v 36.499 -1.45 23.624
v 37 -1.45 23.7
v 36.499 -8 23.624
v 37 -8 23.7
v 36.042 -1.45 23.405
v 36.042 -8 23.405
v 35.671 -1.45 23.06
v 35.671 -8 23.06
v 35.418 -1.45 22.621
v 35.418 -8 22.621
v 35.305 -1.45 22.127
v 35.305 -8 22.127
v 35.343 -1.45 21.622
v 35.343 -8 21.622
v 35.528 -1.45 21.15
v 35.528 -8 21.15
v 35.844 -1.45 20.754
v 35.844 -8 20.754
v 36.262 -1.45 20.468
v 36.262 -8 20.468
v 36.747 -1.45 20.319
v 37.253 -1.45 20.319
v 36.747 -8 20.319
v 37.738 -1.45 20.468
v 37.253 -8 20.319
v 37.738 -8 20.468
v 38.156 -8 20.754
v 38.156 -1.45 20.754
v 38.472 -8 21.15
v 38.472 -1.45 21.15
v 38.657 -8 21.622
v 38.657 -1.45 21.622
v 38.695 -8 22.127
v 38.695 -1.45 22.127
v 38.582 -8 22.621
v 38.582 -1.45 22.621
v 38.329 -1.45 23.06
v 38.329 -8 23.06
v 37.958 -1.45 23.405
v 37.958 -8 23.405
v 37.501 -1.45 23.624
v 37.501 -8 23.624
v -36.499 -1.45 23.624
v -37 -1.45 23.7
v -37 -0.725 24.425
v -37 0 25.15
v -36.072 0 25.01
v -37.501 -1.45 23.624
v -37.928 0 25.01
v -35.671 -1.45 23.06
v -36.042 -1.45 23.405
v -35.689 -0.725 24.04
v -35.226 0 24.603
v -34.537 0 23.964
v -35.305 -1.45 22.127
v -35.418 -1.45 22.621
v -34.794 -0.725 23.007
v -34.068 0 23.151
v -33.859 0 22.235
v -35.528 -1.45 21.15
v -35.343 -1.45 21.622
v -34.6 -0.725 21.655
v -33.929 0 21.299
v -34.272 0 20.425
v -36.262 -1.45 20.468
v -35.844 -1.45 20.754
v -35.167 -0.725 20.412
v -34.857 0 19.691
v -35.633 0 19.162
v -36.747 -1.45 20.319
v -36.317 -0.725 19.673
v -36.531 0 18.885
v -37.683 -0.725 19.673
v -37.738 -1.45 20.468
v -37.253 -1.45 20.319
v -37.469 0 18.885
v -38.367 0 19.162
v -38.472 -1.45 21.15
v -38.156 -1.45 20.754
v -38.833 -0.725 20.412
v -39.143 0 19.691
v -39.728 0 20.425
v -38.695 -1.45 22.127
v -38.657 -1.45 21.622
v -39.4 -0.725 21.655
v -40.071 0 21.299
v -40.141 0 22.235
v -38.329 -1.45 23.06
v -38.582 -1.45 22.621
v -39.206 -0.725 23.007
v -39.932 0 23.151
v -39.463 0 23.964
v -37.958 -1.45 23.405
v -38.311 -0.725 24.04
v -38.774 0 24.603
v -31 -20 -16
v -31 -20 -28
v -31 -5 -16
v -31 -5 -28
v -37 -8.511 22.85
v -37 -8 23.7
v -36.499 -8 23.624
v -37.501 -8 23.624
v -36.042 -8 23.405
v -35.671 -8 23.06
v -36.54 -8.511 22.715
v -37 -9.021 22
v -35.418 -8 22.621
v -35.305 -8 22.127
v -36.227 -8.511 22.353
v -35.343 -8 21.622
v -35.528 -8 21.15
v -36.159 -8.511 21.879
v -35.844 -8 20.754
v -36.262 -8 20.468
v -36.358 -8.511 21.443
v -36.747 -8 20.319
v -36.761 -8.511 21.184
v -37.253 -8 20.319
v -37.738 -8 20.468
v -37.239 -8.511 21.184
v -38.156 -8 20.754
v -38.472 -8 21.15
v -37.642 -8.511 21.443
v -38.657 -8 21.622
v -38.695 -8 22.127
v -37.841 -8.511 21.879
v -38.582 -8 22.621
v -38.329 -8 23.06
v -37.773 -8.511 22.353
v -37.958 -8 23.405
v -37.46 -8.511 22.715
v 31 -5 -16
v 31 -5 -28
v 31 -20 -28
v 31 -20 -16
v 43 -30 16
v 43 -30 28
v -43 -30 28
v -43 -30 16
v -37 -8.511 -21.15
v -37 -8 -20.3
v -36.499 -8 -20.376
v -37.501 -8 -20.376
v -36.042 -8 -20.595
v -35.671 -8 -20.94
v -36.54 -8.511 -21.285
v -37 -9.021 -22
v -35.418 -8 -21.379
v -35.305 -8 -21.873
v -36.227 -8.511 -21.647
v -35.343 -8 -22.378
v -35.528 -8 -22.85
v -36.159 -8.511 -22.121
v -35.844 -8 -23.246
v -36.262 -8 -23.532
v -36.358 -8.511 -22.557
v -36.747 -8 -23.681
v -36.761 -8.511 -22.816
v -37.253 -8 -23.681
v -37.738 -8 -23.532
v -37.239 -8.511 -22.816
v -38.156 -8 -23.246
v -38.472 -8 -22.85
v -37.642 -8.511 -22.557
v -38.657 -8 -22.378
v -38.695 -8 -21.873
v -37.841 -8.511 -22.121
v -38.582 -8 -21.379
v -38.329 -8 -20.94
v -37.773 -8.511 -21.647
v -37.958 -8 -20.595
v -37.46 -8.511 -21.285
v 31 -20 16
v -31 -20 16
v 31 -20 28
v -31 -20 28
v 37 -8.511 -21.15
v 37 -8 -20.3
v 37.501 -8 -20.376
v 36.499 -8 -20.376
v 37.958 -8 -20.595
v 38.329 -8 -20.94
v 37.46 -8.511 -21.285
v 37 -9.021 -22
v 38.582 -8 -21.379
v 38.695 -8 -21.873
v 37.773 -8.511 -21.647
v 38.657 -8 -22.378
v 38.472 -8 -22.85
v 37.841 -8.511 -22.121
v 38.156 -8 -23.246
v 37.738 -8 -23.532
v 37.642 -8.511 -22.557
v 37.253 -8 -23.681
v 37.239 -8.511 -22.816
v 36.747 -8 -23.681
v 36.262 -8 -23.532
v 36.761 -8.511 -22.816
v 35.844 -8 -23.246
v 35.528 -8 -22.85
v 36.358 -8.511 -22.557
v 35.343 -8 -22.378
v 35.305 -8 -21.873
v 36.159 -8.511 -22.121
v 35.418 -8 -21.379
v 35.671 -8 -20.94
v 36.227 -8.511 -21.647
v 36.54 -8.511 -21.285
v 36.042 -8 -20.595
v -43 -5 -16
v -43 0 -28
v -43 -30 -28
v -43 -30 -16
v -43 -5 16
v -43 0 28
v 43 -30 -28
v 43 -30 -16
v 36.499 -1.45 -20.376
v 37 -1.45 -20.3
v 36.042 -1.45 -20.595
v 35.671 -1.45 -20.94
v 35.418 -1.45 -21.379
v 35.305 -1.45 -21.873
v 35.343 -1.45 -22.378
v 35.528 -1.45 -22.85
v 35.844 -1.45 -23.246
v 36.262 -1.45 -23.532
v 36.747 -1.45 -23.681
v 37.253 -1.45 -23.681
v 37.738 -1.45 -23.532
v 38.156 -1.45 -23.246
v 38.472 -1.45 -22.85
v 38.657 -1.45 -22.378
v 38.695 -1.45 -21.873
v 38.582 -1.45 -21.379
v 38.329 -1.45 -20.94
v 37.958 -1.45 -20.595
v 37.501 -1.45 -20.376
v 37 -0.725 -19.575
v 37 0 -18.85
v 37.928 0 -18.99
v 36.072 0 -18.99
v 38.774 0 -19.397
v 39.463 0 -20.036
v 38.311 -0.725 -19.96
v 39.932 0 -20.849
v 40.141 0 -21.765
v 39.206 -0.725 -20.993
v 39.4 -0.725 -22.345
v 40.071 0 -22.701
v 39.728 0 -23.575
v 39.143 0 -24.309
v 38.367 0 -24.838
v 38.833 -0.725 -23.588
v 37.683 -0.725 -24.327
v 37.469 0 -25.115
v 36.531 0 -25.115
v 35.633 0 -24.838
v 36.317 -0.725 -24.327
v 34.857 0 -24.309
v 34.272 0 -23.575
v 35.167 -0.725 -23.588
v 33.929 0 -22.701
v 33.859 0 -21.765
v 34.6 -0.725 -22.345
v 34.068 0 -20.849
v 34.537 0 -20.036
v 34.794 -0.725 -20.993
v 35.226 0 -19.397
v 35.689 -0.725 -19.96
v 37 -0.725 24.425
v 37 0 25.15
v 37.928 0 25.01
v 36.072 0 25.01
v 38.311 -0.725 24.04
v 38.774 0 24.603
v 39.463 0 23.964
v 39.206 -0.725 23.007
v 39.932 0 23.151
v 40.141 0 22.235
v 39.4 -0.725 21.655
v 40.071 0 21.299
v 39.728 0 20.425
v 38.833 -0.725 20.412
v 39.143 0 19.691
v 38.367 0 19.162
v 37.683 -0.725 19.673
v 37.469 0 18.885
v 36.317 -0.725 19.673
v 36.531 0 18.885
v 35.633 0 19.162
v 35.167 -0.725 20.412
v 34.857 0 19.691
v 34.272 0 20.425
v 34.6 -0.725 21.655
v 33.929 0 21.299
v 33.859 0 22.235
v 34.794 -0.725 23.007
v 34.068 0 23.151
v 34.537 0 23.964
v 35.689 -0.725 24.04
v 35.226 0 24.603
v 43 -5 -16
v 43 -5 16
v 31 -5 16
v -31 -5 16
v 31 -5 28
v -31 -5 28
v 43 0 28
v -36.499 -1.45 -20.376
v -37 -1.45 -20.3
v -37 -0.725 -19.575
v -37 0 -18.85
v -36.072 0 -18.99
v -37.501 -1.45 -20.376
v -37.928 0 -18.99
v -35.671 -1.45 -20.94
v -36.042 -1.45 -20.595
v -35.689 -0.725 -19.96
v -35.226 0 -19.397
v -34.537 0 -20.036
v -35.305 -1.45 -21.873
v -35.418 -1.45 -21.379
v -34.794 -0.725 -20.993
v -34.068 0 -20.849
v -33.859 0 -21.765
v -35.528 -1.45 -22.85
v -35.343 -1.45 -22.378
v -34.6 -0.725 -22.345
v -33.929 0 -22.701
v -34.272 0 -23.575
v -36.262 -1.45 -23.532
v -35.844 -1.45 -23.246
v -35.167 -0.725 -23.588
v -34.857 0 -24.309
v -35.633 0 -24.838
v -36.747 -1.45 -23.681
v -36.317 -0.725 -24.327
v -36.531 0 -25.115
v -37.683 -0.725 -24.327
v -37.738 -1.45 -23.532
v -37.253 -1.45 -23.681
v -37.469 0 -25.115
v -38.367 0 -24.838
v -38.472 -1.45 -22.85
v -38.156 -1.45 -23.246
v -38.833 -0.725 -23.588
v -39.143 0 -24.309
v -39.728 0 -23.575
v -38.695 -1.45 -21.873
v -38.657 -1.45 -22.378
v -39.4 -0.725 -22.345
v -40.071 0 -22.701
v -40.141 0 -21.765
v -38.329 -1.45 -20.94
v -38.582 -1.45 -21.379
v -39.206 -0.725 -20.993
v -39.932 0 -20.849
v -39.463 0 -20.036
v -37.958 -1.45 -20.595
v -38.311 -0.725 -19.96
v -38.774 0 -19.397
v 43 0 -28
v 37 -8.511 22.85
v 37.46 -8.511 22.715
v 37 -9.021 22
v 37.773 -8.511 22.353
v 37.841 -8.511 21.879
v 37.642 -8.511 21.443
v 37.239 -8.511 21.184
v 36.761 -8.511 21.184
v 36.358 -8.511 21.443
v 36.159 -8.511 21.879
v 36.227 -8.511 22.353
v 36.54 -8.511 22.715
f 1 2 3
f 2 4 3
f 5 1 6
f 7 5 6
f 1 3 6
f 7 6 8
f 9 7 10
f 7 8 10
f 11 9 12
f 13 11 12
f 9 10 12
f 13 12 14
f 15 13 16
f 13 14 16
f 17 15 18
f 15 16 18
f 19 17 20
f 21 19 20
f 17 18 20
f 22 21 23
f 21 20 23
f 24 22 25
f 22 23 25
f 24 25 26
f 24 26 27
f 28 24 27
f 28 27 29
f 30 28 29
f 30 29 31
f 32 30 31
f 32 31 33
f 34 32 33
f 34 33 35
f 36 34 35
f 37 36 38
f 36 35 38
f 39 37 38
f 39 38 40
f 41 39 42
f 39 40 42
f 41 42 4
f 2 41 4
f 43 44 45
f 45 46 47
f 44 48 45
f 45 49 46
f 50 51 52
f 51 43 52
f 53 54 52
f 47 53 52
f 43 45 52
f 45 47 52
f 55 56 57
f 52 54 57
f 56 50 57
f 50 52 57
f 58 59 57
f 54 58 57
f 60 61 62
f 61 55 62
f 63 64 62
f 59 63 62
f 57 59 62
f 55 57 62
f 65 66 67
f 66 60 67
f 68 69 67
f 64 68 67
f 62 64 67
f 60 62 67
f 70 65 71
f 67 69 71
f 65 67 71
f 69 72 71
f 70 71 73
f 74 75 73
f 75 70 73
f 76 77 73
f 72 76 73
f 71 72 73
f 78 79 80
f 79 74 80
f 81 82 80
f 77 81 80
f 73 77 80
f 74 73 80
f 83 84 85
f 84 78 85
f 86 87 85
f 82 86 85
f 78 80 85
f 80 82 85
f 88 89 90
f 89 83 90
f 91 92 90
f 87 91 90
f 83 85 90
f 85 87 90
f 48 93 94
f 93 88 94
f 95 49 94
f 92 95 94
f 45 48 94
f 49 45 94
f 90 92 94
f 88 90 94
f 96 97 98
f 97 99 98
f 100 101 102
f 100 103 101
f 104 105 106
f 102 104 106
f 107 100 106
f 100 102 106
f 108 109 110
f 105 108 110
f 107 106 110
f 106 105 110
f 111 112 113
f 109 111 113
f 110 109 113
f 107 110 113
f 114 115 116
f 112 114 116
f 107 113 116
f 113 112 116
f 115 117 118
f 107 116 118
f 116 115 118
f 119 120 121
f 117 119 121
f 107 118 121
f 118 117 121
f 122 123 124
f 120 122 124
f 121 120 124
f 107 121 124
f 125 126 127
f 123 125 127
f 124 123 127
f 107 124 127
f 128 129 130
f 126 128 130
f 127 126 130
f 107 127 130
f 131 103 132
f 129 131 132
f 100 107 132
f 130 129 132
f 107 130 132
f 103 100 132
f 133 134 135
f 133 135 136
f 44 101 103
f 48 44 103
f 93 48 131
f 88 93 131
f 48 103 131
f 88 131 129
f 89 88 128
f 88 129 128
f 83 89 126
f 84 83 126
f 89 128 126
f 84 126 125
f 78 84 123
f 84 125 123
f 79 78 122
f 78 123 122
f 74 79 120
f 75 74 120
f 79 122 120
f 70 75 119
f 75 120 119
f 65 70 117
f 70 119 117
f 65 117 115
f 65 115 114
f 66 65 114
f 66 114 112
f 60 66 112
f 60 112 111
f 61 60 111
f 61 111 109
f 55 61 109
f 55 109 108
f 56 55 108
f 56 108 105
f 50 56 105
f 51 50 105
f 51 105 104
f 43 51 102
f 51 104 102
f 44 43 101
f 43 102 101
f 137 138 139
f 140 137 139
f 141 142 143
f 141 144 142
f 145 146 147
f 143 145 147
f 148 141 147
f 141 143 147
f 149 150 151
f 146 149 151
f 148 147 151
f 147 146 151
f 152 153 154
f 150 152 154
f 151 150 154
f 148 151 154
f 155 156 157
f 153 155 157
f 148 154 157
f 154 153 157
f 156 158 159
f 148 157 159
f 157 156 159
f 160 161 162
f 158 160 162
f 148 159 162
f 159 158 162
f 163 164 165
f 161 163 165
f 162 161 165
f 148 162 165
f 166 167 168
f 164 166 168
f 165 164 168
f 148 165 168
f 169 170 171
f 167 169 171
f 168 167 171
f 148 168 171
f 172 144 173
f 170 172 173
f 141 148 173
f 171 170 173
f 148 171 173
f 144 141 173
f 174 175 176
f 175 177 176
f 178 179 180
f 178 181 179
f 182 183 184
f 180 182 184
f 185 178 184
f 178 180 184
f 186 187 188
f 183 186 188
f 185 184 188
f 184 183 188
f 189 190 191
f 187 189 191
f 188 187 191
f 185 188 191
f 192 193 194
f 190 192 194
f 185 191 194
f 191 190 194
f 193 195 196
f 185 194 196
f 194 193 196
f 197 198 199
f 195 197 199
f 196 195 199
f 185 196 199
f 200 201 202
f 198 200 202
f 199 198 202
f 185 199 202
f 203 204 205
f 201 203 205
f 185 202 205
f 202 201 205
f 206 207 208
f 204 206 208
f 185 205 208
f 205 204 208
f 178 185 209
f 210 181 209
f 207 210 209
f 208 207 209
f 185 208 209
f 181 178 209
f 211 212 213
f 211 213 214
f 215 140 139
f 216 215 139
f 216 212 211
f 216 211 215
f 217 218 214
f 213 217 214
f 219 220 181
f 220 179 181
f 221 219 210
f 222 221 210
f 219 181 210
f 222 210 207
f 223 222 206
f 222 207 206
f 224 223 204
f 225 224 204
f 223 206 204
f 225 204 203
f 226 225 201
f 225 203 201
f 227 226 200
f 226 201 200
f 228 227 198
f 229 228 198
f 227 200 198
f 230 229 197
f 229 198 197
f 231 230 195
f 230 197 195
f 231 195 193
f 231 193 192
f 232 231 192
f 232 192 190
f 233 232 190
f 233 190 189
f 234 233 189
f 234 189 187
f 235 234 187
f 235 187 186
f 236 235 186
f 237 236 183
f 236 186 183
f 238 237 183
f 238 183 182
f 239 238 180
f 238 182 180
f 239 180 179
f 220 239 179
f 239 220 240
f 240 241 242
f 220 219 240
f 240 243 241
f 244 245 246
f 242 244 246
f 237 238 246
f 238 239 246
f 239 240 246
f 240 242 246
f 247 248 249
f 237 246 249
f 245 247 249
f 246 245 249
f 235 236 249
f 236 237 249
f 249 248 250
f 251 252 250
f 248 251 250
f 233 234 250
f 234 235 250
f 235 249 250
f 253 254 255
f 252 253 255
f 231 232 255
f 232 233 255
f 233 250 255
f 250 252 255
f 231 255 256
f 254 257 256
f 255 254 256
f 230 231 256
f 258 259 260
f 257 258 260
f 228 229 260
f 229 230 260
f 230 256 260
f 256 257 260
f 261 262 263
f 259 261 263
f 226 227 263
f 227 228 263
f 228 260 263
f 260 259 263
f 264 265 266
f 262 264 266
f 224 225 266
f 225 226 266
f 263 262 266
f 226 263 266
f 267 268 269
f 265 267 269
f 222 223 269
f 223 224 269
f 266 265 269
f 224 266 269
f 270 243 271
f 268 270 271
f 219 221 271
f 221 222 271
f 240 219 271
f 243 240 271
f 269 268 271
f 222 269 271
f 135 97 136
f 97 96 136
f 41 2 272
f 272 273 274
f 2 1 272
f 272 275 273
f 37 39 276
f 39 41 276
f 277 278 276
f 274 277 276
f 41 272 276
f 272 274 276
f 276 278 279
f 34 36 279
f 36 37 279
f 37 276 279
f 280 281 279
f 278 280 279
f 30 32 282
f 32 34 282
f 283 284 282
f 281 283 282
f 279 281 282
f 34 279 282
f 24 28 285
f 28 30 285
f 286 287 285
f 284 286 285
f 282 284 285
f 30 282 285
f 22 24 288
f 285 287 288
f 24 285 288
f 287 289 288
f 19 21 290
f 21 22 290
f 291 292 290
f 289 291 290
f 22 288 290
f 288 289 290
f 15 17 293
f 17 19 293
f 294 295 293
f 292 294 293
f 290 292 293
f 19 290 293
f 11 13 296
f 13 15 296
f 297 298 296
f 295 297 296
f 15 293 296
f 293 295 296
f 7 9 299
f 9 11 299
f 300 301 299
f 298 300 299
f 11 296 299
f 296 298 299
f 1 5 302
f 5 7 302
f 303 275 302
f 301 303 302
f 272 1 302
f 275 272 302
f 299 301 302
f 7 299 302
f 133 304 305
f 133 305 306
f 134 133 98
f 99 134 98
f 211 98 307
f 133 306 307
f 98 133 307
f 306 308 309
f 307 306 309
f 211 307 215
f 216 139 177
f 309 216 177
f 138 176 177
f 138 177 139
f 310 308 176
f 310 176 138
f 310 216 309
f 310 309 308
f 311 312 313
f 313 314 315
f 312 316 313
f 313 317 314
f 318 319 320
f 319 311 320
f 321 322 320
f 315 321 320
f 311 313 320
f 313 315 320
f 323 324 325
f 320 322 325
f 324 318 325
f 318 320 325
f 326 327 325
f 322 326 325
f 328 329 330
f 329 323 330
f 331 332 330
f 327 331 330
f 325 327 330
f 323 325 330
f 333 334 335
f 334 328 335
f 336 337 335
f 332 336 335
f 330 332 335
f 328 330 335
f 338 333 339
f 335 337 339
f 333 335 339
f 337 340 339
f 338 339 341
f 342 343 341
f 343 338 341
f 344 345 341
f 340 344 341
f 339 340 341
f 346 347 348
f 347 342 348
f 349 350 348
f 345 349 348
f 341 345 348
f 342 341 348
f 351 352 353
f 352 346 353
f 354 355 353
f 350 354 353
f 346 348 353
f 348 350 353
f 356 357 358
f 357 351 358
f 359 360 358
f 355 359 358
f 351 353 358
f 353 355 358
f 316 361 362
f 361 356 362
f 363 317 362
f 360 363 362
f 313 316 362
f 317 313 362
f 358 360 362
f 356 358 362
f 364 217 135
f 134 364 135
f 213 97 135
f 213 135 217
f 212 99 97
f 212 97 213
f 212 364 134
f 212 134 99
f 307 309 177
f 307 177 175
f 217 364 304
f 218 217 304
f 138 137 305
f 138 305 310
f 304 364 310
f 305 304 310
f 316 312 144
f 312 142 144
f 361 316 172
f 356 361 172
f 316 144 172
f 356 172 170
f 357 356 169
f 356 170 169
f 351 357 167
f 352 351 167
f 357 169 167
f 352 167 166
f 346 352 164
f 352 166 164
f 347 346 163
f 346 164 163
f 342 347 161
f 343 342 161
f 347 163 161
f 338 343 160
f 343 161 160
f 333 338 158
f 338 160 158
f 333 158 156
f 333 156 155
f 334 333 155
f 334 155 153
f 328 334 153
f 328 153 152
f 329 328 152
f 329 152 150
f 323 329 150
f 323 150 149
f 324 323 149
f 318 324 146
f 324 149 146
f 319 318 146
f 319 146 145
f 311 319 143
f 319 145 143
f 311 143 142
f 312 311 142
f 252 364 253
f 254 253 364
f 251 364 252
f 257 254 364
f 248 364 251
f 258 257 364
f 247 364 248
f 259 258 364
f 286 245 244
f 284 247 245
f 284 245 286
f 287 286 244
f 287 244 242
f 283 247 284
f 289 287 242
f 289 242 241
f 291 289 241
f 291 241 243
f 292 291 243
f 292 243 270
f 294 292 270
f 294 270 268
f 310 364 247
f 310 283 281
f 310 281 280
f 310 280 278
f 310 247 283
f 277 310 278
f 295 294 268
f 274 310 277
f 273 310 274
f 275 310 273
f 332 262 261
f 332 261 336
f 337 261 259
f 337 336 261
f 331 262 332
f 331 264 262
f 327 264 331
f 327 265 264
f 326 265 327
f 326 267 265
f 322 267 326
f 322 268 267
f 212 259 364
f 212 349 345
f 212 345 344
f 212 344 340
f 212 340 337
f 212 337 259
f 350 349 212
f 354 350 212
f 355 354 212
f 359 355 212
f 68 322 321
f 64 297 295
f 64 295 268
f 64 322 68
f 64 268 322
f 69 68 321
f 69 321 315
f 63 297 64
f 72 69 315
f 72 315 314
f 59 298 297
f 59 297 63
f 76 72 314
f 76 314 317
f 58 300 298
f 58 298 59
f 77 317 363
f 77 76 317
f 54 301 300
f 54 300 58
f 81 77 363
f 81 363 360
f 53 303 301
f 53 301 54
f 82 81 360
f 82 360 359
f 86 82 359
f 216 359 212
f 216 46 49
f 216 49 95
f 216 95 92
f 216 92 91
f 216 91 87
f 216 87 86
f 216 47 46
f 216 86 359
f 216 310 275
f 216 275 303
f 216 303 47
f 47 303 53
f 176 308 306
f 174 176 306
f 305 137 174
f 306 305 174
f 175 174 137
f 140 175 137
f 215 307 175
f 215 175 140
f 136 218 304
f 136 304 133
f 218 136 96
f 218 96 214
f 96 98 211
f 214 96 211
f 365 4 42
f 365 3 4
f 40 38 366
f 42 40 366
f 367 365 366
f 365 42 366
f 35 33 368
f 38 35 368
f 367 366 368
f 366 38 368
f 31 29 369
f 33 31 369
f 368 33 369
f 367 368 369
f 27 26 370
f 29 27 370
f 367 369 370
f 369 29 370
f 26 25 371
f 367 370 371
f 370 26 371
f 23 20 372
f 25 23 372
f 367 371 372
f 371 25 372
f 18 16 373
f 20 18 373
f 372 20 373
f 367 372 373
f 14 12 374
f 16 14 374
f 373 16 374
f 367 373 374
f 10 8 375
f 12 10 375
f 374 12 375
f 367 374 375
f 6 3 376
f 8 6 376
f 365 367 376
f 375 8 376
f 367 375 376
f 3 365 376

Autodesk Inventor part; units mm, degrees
ref_plane "YZ Plane" through (0, 0, 0) normal (1, 0, 0) x (0, 1, 0)
ref_plane "XZ Plane" through (0, 0, 0) normal (0, 1, 0) x (-1, 0, 0)
ref_plane "XY Plane" through (0, 0, 0) normal (0, 0, 1) x (1, 0, 0)
sketch "Sketch1" plane through (0, 0, 0) normal (0, 1, 0) x (-1, 0, 0)
  line L0 (-37, 22) -> (37, 22) construction
  line L1 (37, 22) -> (37, -22) construction
  line L2 (37, -22) -> (-37, -22) construction
  line L3 (-37, -22) -> (-37, 22) construction
  line L4 (-37, 22) -> (37, -22) construction
  line L5 (37, 22) -> (-37, -22) construction
  line L6 (-47, 32) -> (47, 32) construction
  line L7 (47, 32) -> (47, -32) construction
  line L8 (47, -32) -> (-47, -32) construction
  line L9 (-47, -32) -> (-47, 32) construction
  line L10 (-47, 32) -> (47, -32) construction
  line L11 (47, 32) -> (-47, -32) construction
  line L12 (31, 16) -> (43, 16)
  line L13 (43, 16) -> (43, 28)
  line L14 (43, 28) -> (31, 28)
  line L15 (31, 28) -> (31, 16)
  line L16 (31, 16) -> (43, 28) construction
  line L17 (43, 16) -> (31, 28) construction
  line L18 (47, 0) -> (-47, 0) construction
  line L19 (0, 32) -> (0, -32) construction
  line L20 (37, -22) -> (-37, 22) construction
  line L21 (47, -32) -> (-47, 32) construction
  line L22 (31, -16) -> (43, -16)
  line L23 (43, -16) -> (43, -28)
  line L24 (43, -28) -> (31, -28)
  line L25 (31, -28) -> (31, -16)
  line L26 (31, -16) -> (43, -28) construction
  line L27 (43, -16) -> (31, -28) construction
  line L28 (-31, 16) -> (-43, 16)
  line L29 (-43, 16) -> (-43, 28)
  line L30 (-43, 28) -> (-31, 28)
  line L31 (-31, 28) -> (-31, 16)
  line L32 (-31, -16) -> (-43, -16)
  line L33 (-31, -28) -> (-31, -16)
  line L34 (-43, -28) -> (-31, -28)
  line L35 (-43, -16) -> (-43, -28)
  line L36 (43, 28) -> (-43, 28)
  line L37 (-43, 28) -> (-43, -28)
  line L38 (-43, -28) -> (43, -28)
  line L39 (43, -28) -> (43, 28)
  point P0 (0, 0)
  dimension "d0" = 74
  dimension "d1" = 44
  dimension "d2" = 10
  dimension "d3" = 10
  dimension "d4" = 12
  dimension "d5" = 12
extrude "Extrusion1" add sketch "Sketch1" against normal blind 5
extrude "Extrusion2" add sketch "Sketch1" against normal blind 30 contours L15 L14 L13 L12 | L23 L24 L25 L22 | L31 L28 L29 L30 | L34 L35 L32 L33
hole "Hole2" at (-37, 0, 22) at (-37, 0, -22) at (37, 0, -22) at (37, 0, 22) direction (0, -1, 0) diameter 3.4 depth 8 tip angle 118 countersink diameter 6.3 countersink angle 90 clearance for "Flat Head Machine Screw" size "M3" standard "Ansi Metric M Profile"
sketch "Sketch4" plane through (0, -30, 0) normal (0, -1, 0) x (1, 0, 0)
  line L0 (31, 28) -> (-31, 28) projected
  line L1 (-43, 16) -> (-31, 16) projected
  line L2 (31, 28) -> (-31, 28)
  line L3 (-31, 28) -> (-31, 16)
  line L4 (-31, 16) -> (31, 16)
  line L5 (31, 16) -> (31, 28)
  line L6 (43, -28) -> (-43, -28) projected
  line L7 (-43, -16) -> (-31, -16) projected
  line L8 (31, -28) -> (-31, -28)
  line L9 (-31, -28) -> (-31, -16)
  line L10 (-31, -16) -> (31, -16)
  line L11 (31, -16) -> (31, -28)
  point P0 (0, 0)
extrude "Extrusion3" add sketch "Sketch4" against normal blind 10
properties part number "PCB_Housing_01"
